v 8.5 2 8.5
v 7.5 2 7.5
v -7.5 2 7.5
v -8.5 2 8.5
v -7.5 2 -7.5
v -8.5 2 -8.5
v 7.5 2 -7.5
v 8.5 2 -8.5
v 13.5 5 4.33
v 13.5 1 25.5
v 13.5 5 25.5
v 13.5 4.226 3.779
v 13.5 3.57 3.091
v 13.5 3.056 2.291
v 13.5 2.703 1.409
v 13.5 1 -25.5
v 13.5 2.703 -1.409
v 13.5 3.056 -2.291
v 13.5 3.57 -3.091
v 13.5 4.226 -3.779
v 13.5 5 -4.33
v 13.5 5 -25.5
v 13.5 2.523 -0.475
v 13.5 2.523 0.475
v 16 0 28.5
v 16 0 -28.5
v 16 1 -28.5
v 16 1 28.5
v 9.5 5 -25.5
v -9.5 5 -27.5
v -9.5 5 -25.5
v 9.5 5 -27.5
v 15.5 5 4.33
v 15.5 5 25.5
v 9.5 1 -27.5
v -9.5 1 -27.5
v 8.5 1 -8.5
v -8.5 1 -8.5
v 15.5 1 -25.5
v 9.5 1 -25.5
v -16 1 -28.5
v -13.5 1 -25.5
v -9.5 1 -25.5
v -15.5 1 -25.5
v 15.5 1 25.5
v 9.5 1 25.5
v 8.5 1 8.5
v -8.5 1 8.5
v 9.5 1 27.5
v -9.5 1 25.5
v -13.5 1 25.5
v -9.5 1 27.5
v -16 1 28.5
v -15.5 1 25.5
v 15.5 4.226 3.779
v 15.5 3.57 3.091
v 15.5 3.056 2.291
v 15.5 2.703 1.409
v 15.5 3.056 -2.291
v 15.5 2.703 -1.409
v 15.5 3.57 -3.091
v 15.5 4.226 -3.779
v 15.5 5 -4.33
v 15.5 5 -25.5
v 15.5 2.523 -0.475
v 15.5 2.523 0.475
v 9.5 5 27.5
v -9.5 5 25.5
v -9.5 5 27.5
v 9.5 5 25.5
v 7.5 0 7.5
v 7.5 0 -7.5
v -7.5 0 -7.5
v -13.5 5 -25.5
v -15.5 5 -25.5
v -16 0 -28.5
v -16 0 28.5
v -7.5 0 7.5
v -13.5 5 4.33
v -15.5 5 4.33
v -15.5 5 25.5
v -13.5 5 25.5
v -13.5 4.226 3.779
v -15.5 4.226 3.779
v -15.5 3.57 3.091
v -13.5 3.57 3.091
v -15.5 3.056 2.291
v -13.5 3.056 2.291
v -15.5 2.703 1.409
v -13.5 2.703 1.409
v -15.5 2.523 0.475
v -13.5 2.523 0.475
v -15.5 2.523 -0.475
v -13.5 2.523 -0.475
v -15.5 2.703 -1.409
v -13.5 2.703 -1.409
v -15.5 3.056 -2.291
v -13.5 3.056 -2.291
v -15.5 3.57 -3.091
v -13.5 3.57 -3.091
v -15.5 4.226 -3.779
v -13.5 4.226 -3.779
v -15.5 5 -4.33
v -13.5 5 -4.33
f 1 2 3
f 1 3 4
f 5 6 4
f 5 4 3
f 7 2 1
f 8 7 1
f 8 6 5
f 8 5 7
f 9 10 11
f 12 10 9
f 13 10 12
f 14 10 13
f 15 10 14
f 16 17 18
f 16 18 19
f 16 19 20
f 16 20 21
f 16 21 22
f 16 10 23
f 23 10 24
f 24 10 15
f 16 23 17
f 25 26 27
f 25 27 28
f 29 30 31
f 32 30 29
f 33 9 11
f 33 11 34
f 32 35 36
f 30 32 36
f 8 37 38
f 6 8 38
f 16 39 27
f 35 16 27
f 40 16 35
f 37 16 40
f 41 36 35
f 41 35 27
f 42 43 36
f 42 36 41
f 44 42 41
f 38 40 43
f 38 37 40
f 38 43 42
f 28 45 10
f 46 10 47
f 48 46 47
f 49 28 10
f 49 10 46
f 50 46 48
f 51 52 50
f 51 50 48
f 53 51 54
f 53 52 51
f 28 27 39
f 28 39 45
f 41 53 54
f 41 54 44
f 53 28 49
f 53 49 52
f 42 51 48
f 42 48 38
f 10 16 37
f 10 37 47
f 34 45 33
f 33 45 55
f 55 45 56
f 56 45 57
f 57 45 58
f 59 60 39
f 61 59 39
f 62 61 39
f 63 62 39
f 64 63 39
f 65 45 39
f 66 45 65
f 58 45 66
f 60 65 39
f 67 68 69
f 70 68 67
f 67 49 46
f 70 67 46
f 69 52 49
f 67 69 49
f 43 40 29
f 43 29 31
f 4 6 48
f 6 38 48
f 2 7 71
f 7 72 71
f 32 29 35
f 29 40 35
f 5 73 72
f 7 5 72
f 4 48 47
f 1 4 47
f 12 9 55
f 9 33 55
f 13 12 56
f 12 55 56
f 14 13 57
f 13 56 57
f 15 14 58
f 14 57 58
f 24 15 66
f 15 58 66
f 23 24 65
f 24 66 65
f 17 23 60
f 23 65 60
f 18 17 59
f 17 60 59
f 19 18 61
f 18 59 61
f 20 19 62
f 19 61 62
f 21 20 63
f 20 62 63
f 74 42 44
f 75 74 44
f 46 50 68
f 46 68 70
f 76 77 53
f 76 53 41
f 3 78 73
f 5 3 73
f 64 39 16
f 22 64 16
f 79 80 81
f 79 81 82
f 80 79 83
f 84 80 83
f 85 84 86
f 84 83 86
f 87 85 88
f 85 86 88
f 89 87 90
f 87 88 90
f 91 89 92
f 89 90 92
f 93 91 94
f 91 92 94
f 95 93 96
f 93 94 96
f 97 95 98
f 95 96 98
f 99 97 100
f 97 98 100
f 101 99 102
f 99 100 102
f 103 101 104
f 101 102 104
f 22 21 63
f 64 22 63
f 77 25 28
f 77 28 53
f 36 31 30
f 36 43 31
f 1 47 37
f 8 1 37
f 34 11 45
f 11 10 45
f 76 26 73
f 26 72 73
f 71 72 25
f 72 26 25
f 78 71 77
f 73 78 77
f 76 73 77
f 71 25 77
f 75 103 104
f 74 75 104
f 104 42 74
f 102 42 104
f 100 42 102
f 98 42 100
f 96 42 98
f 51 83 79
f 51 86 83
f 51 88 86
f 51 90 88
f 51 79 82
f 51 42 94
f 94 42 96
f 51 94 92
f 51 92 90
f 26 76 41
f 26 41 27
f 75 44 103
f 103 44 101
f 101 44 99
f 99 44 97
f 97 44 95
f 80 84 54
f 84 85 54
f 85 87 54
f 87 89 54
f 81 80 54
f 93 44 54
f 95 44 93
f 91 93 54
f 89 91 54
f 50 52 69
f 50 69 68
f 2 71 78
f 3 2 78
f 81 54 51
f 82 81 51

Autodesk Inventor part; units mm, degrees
ref_plane "YZ Plane" through (0, 0, 0) normal (1, 0, 0) x (0, 1, 0)
ref_plane "XZ Plane" through (0, 0, 0) normal (0, 1, 0) x (-1, 0, 0)
ref_plane "XY Plane" through (0, 0, 0) normal (0, 0, 1) x (1, 0, 0)
sketch "Sketch1" plane through (0, 0, 0) normal (0, 1, 0) x (-1, 0, 0)
  line L0 (16, -28.5) -> (-16, -28.5)
  line L1 (-16, -28.5) -> (-16, 28.5)
  line L2 (-16, 28.5) -> (16, 28.5)
  line L3 (16, 28.5) -> (16, -28.5)
  line L4 (16, -28.5) -> (-16, 28.5) construction
  line L5 (-16, -28.5) -> (16, 28.5) construction
  point P0 (0, 0)
  dimension "d0" = 32
  dimension "d1" = 57
extrude "Extrusion1" add sketch "Sketch1" along normal blind 1
sketch "Sketch2" plane through (0, 1, 0) normal (0, 1, 0) x (1, 0, 0)
  line L0 (-9.5, -27.5) -> (9.5, -27.5)
  line L1 (15.5, -25.5) -> (15.5, 25.5)
  line L2 (9.5, 27.5) -> (-9.5, 27.5)
  line L3 (-15.5, 25.5) -> (-15.5, -25.5)
  line L4 (-15.5, -27.5) -> (15.5, 27.5) construction
  line L5 (15.5, -27.5) -> (-15.5, 27.5) construction
  line L6 (13.5, -25.5) -> (13.5, 25.5)
  line L7 (-13.5, 25.5) -> (-13.5, -25.5)
  line L8 (-16, -28.5) -> (16, -28.5) projected
  line L9 (-9.5, -28.4306) -> (-9.5, -25.5)
  line L10 (9.5, 25.5) -> (9.5, 27.5)
  line L11 (-9.5, -16.8548) -> (-9.5, 16.8548)
  line L12 (-9.5, 25.5) -> (-9.5, 28.5928)
  line L13 (9.5, -28.5) -> (9.5, -25.5)
  line L14 (9.5, -16.8548) -> (9.5, 16.8548)
  line L15 (13.5, -25.5) -> (15.5, -25.5)
  line L16 (15.5, 25.5) -> (13.5, 25.5)
  line L17 (9.5, 25.5) -> (-9.5, 25.5)
  line L18 (-13.5, 25.5) -> (-15.5, 25.5)
  line L19 (-15.5, -25.5) -> (-13.5, -25.5)
  line L20 (-9.5, -25.5) -> (9.5, -25.5)
  point P0 (0, 0)
  dimension "d4" = 31
  dimension "d5" = 55
  dimension "d6" = 2
extrude "Extrusion2" add sketch "Sketch2" along normal blind 4
sketch "Sketch3" plane through (15.5, 1, 25.5) normal (1, 0, 0) x (0, 0, -1)
  circle A0 centre (25.5, 6.5) radius 5
  line L0 (-3, 0) -> (54, 0) projected
  point P0 (25.5, -1)
  dimension "d11" = 10
  dimension "d12" = 6.5
extrude "Extrusion3" cut sketch "Sketch3" against normal through all
sketch "Sketch4" plane through (0, 0, 0) normal (0, -1, 0) x (1, 0, 0)
  line L0 (7.5, -7.5) -> (-7.5, -7.5)
  line L1 (-7.5, -7.5) -> (-7.5, 7.5)
  line L2 (-7.5, 7.5) -> (7.5, 7.5)
  line L3 (7.5, 7.5) -> (7.5, -7.5)
  line L4 (7.5, -7.5) -> (-7.5, 7.5) construction
  line L5 (-7.5, -7.5) -> (7.5, 7.5) construction
  point P0 (0, 0)
  dimension "d15" = 15
  dimension "d16" = 15
extrude "Extrusion4" cut sketch "Sketch4" against normal through all
sketch "Sketch5" plane through (0, 1, 0) normal (0, 1, 0) x (1, 0, 0)
  line L0 (7.5, 7.5) -> (7.5, -7.5) projected
  line L1 (7.5, -7.5) -> (-7.5, -7.5) projected
  line L2 (-7.5, -7.5) -> (-7.5, 7.5) projected
  line L3 (-7.5, 7.5) -> (7.5, 7.5) projected
  line L4 (-13.5, -25.5) -> (-15.5, -25.5) projected
  line L5 (-15.5, -25.5) -> (-15.5, 25.5) projected
  line L6 (-15.5, 25.5) -> (-13.5, 25.5) projected
  line L7 (-13.5, 25.5) -> (-13.5, -25.5) projected
  line L8 (9.5, -27.5) -> (-9.5, -27.5) projected
  line L9 (-9.5, -27.5) -> (-9.5, -25.5) projected
  line L10 (-9.5, -25.5) -> (9.5, -25.5) projected
  line L11 (9.5, -25.5) -> (9.5, -27.5) projected
  line L12 (9.5, 27.5) -> (9.5, 25.5) projected
  line L13 (9.5, 25.5) -> (-9.5, 25.5) projected
  line L14 (-9.5, 25.5) -> (-9.5, 27.5) projected
  line L15 (-9.5, 27.5) -> (9.5, 27.5) projected
  line L16 (13.5, 25.5) -> (15.5, 25.5) projected
  line L17 (15.5, 25.5) -> (15.5, -25.5) projected
  line L18 (15.5, -25.5) -> (13.5, -25.5) projected
  line L19 (13.5, -25.5) -> (13.5, 25.5) projected
  line L20 (16, 28.5) -> (-16, 28.5) projected
  line L21 (-16, 28.5) -> (-16, -28.5) projected
  line L22 (-16, -28.5) -> (16, -28.5) projected
  line L23 (16, -28.5) -> (16, 28.5) projected
  line L24 (-8.5, -8.5) -> (8.5, -8.5)
  line L25 (8.5, -8.5) -> (8.5, 8.5)
  line L26 (8.5, 8.5) -> (-8.5, 8.5)
  line L27 (-8.5, 8.5) -> (-8.5, -8.5)
  point P0 (0, 0)
  dimension "d19" = 1
extrude "Extrusion5" add sketch "Sketch5" along normal blind 1 contours L27 L26 L25 L24
properties part number "hull_cover"
